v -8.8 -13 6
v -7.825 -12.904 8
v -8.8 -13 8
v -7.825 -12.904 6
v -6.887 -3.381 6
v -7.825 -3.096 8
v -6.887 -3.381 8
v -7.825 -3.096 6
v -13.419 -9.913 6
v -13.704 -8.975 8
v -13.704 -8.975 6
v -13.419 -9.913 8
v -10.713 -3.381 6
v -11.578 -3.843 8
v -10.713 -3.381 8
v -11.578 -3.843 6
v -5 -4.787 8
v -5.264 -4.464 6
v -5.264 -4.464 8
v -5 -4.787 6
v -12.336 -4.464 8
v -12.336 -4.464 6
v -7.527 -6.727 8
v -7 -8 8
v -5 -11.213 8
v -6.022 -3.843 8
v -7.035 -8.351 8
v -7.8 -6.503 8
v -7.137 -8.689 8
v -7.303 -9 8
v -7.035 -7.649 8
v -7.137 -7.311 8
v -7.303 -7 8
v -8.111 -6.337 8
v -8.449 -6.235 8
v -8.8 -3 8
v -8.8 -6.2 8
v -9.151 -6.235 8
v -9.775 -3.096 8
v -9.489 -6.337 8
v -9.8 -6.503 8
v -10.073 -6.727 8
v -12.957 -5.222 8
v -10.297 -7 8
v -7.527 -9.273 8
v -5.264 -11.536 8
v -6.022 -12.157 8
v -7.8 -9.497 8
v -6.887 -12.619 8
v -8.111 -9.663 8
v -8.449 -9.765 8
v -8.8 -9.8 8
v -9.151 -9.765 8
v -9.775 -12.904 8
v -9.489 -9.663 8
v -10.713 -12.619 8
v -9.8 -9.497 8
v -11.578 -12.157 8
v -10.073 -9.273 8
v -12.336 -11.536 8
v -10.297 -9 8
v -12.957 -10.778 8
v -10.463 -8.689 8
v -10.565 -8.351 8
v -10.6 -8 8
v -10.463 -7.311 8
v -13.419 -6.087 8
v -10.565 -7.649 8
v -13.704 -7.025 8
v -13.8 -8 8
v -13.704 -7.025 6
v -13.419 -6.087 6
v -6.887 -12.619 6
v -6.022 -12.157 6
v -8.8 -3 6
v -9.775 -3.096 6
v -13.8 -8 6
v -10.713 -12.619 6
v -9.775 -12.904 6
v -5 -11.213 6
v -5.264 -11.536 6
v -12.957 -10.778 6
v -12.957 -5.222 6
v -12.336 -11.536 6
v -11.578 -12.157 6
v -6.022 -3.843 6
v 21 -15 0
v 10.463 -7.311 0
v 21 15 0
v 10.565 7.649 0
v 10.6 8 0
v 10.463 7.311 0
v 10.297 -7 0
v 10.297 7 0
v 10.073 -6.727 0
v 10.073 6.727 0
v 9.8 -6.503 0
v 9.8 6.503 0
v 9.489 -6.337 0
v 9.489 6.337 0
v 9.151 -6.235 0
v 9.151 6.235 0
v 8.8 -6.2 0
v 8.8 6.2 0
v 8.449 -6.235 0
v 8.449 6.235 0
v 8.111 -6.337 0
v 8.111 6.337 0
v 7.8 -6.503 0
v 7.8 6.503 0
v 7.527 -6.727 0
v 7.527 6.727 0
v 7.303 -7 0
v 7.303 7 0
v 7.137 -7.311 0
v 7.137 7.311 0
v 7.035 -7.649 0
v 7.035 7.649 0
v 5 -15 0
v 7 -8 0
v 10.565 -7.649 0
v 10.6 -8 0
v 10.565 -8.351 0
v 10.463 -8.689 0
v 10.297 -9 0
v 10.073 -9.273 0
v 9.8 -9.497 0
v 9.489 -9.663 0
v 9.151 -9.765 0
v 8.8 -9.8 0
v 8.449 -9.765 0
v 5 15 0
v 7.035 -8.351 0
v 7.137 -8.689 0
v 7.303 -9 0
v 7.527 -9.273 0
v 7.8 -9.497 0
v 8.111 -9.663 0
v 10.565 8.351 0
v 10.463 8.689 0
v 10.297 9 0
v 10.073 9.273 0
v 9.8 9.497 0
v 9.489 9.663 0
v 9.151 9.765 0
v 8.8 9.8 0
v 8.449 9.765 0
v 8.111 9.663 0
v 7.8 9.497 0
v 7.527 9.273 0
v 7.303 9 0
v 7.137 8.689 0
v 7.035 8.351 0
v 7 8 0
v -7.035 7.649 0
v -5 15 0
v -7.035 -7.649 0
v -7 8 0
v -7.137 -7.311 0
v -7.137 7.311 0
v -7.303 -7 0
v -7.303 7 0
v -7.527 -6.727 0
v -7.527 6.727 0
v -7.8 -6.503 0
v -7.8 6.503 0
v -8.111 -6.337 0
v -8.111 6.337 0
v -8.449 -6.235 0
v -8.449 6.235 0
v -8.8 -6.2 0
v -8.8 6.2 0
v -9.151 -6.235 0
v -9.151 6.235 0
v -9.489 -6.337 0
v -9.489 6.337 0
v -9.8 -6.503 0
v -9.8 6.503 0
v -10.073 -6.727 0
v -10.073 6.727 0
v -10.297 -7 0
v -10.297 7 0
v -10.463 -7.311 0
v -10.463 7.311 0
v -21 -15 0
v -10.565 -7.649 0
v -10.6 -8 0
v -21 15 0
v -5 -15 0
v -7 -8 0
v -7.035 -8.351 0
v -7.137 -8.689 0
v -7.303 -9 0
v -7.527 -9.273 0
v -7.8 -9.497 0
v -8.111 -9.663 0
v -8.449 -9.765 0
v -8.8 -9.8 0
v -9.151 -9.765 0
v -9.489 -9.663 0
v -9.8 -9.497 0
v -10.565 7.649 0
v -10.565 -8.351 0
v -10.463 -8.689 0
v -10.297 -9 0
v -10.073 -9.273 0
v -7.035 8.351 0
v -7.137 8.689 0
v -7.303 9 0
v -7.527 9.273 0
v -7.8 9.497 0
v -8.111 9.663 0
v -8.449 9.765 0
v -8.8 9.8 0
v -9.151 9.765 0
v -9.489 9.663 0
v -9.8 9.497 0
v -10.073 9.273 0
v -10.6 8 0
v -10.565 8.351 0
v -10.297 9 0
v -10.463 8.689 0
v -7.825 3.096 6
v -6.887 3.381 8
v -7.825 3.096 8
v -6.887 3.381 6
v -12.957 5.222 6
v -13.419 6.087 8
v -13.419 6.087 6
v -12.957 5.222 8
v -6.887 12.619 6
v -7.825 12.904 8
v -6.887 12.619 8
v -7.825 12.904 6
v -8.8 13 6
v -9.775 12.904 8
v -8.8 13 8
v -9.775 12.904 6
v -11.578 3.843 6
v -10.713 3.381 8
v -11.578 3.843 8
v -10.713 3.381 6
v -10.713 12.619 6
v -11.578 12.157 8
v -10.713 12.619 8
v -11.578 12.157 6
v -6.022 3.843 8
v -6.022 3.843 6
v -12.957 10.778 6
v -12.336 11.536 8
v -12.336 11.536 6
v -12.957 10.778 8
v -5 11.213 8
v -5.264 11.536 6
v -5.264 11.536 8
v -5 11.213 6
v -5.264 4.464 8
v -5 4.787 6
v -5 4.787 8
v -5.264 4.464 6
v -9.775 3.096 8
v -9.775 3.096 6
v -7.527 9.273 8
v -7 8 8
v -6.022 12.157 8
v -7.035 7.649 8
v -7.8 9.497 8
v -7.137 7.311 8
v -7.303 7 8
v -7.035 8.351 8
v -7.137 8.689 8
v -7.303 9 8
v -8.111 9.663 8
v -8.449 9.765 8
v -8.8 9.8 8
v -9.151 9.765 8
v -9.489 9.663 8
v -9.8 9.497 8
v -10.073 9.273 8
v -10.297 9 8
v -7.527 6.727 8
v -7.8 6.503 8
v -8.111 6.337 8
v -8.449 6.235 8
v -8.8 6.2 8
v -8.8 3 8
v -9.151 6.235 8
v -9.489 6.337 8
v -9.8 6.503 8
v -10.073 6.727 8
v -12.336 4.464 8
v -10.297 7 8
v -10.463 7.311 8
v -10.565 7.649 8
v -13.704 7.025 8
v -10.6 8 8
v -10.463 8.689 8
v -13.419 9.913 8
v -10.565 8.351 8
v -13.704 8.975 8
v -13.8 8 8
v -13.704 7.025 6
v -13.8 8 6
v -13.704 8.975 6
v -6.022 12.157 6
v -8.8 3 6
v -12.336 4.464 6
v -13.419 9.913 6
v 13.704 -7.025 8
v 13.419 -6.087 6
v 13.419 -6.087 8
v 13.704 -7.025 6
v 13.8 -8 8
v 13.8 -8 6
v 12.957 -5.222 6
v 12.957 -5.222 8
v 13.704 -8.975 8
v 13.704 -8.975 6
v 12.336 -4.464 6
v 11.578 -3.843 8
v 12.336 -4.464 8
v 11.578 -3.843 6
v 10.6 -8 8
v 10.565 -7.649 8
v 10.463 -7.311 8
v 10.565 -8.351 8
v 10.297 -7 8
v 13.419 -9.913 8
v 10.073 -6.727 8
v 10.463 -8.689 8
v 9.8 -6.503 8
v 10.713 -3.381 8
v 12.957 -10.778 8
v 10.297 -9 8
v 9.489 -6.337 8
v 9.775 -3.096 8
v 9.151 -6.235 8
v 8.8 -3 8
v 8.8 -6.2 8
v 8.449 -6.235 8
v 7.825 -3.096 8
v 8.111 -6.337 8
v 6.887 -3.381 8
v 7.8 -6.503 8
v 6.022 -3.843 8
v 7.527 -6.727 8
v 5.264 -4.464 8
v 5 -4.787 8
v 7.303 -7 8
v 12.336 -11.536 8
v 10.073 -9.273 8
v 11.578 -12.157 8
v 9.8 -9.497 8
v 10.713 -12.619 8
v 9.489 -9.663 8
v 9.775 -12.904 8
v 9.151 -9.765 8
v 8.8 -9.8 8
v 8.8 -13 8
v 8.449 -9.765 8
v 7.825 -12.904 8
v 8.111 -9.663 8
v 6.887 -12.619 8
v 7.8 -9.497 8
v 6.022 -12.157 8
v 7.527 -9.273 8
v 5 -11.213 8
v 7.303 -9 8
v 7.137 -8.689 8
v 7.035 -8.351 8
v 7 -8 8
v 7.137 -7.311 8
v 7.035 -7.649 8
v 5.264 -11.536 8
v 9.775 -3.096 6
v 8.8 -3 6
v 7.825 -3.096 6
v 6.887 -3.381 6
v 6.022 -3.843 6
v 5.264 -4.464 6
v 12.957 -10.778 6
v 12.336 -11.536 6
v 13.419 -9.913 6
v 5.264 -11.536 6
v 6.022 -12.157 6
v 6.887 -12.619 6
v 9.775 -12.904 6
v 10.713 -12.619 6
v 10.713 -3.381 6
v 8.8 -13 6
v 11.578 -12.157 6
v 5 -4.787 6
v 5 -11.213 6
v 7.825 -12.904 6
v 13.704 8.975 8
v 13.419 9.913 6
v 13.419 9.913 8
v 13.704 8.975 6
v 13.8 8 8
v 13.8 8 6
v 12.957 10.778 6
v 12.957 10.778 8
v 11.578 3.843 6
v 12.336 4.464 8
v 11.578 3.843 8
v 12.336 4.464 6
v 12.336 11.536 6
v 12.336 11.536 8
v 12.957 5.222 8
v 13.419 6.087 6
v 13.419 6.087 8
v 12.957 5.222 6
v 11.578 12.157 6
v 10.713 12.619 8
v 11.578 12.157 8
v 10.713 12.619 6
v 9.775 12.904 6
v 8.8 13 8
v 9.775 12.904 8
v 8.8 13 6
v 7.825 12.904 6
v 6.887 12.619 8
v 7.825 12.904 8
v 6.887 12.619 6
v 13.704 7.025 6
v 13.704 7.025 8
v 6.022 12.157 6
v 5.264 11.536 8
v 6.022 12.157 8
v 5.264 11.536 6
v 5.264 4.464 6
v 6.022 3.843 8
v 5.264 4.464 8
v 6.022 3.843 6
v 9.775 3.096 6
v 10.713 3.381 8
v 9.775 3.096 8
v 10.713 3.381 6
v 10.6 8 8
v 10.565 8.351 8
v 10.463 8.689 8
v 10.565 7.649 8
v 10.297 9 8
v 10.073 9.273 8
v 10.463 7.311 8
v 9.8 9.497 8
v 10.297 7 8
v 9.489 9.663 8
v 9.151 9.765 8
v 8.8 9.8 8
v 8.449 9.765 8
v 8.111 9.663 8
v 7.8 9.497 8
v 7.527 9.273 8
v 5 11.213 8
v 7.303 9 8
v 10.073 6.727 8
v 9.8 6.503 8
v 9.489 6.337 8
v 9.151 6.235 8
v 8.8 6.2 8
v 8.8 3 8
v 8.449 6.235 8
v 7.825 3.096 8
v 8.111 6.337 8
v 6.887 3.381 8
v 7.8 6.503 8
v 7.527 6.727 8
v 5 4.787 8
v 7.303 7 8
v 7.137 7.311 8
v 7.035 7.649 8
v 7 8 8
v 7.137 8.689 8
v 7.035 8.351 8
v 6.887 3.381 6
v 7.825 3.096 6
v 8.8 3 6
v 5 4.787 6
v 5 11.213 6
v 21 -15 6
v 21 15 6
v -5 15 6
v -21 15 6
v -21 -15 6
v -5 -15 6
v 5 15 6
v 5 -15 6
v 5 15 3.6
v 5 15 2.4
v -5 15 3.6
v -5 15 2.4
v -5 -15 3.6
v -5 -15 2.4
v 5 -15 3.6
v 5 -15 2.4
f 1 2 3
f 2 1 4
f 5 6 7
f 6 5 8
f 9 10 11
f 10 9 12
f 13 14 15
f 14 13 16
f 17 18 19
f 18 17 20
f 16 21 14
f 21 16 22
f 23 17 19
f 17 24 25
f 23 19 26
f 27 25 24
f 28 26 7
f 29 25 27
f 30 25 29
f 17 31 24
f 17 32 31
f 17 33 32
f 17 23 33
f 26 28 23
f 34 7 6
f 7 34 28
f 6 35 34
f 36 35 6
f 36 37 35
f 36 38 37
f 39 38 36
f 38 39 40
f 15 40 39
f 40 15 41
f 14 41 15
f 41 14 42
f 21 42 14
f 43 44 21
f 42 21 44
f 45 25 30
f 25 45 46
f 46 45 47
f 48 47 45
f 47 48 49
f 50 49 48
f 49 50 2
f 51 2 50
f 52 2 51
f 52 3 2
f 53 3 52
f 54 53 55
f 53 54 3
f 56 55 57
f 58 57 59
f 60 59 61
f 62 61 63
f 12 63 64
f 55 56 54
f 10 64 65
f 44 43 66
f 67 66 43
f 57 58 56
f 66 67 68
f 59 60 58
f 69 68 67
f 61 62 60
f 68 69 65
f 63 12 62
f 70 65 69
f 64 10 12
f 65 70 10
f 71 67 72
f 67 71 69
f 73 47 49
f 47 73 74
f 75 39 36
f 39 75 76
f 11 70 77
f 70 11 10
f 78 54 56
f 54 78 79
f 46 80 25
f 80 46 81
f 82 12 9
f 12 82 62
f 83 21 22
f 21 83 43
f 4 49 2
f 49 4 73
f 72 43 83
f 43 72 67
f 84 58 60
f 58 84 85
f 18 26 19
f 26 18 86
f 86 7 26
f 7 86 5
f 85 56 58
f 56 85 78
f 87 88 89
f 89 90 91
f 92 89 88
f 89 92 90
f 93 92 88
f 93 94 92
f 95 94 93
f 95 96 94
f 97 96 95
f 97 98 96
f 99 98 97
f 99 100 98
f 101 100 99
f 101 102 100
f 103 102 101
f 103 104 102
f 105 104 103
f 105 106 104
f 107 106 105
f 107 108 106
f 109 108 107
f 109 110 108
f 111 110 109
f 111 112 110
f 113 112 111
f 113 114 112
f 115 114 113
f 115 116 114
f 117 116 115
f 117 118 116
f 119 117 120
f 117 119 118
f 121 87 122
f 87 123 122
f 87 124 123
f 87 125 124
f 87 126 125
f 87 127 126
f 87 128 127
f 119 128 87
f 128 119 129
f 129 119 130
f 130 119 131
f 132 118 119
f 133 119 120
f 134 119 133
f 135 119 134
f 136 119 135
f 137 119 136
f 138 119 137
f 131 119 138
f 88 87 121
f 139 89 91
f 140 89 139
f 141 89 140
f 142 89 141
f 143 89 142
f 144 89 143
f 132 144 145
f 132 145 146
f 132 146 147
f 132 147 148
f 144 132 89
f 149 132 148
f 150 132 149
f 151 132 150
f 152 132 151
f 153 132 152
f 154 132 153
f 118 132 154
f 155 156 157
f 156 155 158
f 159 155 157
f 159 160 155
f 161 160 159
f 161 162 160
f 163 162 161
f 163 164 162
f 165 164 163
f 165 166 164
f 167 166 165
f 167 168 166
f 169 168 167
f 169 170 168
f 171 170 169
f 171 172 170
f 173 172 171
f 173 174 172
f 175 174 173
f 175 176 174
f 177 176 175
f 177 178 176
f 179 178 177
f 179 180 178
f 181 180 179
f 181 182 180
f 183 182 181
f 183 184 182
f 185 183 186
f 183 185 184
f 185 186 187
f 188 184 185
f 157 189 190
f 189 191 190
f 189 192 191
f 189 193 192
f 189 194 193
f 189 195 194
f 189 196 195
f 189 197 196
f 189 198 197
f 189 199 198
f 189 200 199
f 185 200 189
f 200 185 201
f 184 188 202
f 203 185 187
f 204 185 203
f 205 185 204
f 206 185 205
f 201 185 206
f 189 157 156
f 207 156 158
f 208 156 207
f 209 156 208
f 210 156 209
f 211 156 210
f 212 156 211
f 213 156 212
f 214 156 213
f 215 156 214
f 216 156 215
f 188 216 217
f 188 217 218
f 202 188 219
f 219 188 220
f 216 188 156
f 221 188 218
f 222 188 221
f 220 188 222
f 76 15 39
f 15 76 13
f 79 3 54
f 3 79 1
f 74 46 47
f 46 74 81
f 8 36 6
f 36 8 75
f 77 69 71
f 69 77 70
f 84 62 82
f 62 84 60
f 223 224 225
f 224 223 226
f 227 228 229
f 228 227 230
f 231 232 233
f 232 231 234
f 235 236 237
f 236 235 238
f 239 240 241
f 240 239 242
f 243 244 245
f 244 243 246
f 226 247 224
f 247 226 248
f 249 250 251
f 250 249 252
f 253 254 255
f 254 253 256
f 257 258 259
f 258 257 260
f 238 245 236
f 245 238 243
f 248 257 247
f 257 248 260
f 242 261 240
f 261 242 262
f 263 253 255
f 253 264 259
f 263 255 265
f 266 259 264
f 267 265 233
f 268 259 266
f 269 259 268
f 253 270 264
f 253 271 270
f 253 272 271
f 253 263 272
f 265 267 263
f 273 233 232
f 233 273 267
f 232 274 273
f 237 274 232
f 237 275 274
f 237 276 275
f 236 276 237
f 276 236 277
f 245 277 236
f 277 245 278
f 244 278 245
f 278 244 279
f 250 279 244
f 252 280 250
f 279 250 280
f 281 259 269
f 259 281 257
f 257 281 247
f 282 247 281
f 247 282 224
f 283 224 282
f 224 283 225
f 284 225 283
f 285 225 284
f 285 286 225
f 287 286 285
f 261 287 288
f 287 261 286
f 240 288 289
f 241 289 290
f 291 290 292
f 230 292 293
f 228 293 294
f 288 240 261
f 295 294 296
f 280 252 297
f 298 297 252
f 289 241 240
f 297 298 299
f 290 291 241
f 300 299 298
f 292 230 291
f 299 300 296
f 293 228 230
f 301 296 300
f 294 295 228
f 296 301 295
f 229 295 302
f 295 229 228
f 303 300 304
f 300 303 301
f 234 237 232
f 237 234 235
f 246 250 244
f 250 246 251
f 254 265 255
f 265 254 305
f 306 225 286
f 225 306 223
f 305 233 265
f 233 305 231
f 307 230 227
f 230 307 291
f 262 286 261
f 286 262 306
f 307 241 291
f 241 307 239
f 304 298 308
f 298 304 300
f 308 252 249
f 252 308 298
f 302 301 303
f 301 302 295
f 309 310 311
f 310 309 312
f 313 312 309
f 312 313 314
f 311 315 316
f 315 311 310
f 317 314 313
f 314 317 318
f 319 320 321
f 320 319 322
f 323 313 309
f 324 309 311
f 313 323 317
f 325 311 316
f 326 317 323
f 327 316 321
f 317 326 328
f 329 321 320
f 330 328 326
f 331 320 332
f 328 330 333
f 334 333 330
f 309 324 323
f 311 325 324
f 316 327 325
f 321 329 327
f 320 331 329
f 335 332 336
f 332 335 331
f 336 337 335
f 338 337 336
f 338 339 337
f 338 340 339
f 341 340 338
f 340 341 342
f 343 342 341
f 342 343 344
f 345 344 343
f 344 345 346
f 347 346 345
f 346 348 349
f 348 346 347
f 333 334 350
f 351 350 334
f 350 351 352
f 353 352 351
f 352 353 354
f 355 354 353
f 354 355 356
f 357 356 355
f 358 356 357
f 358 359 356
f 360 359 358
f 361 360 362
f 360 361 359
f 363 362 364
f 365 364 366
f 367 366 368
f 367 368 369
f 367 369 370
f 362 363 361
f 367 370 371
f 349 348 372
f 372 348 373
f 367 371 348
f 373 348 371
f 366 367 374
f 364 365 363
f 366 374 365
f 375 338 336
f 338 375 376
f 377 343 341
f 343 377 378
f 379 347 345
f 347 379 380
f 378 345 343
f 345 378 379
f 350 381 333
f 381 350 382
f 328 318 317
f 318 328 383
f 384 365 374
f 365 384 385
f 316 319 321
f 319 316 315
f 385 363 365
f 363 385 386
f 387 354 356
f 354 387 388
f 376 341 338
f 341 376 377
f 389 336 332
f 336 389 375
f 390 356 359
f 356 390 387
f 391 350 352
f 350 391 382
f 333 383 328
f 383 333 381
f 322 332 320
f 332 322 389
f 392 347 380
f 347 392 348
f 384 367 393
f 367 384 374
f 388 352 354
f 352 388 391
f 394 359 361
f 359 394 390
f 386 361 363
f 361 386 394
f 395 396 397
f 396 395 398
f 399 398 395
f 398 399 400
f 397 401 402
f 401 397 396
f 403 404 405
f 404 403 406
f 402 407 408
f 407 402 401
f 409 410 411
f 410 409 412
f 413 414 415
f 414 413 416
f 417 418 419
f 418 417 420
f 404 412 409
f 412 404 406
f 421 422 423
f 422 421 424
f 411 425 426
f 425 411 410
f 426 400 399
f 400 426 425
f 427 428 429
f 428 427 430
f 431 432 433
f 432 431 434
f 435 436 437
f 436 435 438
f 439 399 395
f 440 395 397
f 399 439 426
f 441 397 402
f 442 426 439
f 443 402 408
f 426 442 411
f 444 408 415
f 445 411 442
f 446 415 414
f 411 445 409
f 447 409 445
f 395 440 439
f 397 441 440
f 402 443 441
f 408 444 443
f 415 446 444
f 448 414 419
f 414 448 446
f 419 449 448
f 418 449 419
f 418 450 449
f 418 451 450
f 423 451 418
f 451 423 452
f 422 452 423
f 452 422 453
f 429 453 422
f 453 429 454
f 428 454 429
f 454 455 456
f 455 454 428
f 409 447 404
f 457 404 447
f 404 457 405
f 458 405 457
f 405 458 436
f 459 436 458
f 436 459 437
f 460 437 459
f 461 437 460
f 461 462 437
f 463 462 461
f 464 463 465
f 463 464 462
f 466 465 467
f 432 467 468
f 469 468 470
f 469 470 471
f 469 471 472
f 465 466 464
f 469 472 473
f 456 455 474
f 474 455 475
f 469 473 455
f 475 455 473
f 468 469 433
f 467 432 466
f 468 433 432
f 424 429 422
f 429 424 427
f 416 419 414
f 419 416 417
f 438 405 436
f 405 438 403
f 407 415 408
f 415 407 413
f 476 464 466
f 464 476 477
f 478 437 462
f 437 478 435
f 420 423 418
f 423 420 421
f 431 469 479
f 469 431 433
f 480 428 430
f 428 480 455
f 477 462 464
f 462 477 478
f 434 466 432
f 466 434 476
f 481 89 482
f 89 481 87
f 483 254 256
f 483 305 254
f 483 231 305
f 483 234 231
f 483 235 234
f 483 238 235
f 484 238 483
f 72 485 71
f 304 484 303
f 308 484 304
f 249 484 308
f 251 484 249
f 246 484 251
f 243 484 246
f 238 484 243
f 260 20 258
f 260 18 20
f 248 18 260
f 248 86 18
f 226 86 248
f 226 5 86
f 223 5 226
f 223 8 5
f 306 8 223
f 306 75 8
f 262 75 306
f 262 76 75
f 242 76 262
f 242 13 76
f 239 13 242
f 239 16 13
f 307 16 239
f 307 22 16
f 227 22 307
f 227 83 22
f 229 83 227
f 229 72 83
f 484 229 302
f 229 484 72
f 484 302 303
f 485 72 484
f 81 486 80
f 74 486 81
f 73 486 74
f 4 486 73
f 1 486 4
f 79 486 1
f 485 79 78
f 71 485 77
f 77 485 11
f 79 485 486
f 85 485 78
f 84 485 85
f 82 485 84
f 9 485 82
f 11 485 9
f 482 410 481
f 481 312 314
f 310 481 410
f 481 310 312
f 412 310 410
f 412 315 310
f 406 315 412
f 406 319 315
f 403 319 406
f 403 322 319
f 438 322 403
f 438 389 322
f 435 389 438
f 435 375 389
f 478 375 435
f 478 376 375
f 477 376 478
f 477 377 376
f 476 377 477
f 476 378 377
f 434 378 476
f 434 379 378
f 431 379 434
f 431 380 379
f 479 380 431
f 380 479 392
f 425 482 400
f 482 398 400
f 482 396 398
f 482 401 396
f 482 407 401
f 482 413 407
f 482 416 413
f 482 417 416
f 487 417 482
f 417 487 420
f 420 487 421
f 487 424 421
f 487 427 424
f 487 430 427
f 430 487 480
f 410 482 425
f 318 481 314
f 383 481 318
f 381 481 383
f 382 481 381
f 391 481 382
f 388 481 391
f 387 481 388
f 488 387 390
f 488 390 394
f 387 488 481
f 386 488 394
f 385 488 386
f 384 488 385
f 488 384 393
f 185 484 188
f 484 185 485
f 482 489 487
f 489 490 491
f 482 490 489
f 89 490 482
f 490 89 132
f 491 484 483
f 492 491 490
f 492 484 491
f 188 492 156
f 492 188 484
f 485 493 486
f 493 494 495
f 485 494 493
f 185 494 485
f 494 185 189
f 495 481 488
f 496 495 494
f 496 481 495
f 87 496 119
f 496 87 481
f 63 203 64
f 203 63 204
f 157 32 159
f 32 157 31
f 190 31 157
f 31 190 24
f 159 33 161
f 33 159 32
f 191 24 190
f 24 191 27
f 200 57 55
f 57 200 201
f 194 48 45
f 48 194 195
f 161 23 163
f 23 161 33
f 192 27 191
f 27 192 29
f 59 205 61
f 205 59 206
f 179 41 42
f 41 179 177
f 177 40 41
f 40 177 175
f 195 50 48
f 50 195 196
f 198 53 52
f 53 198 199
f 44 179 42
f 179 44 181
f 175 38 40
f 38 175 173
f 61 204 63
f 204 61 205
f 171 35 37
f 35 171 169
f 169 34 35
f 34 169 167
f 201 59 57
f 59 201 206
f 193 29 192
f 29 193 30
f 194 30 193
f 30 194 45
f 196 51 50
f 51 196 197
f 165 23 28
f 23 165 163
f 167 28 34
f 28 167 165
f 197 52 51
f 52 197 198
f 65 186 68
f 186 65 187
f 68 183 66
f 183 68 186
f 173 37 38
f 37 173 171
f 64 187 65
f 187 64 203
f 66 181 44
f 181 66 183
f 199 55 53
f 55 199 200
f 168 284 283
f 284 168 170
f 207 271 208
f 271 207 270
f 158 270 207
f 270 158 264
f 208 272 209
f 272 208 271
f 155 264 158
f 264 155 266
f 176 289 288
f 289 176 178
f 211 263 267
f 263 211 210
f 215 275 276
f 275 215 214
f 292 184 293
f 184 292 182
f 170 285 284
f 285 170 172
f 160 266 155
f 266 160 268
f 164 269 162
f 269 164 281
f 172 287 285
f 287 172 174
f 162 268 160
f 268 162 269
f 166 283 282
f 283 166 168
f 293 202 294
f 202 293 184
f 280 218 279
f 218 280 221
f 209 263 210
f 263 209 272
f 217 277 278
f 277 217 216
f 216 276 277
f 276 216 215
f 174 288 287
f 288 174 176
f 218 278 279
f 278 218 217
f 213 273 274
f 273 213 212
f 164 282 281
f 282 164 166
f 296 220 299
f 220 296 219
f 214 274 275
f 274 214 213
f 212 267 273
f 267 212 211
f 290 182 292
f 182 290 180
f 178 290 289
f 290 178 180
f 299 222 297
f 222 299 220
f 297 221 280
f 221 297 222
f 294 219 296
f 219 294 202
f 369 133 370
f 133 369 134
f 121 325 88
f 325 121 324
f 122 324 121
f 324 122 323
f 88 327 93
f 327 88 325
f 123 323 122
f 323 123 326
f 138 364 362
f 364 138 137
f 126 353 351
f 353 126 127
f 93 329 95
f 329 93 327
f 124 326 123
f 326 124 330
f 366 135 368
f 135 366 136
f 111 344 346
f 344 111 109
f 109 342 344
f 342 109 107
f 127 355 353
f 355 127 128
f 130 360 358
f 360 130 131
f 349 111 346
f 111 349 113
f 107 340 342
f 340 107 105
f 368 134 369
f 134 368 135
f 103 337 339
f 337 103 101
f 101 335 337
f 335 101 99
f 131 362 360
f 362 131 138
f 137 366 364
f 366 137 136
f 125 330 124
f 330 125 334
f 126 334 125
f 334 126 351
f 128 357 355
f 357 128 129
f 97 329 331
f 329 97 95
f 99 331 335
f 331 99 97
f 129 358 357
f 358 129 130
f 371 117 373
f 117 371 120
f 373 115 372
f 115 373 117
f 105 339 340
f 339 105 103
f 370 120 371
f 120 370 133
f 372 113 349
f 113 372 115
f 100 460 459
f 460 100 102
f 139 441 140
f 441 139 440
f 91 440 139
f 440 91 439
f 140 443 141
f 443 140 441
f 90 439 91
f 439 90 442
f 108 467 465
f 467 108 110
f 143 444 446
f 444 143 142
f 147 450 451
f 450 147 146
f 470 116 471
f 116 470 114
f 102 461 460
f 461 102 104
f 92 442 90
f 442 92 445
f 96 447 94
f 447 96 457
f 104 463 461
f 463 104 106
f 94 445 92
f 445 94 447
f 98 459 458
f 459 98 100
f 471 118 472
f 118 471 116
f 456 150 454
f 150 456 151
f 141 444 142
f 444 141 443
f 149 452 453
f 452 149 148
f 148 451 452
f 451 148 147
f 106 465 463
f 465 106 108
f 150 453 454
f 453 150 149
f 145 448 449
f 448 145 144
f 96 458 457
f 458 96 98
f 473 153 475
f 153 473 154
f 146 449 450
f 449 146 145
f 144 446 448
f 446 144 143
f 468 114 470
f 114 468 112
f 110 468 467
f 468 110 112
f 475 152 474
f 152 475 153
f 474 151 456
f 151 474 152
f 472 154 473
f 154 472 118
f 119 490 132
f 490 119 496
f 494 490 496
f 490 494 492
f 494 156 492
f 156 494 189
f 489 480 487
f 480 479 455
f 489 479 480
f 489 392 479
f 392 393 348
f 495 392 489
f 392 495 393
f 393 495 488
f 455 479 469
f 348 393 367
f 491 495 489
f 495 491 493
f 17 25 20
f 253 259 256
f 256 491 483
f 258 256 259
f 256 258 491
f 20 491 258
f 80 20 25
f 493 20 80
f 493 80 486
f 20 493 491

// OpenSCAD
$fn = 32;

// ----------------------------------------------------------------------
// Living hinge: 42 x 30 mm plates, 1.2 mm flexible web
// ----------------------------------------------------------------------

// --- parameters (mm) ---
plate_len = 16;           // plate length outside the web
plate_w = 30;             // plate width
thick = 6;                // plate thickness
web_half = 5;             // half width of the flex band
web_t = 1.2;              // flexible web thickness
web_z = 2.4;              // web position inside the thickness
boss_d = 10;              // screw boss diameter
boss_h = 8;               // screw boss height
boss_x = 8.8;             // screw boss distance from the web
screw_d = 3.6;            // screw hole

difference() {
  union() {
    /* one flat strip, later thinned at the middle */
    translate([-21, -15, 0]) cube([42, 30, 6]);
    /* screw bosses, sunk 0.5 mm into the plates */
    for (sx = [-8.8, 8.8]) {
      for (sy = [-8, 8]) {
        translate([sx, sy, 0]) cylinder(h = boss_h, d = boss_d);
      }
    }
  }
  /* channel from below: leaves the web on top of it */
  translate([-5, -17.5, -2.5]) cube([10, 35, 4.9]);
  /* channel from above: thins the web down to web_t */
  translate([-5, -17.5, 3.6]) cube([10, 35, 4.9]);
  /* screw holes through the bosses */
  for (sx = [-8.8, 8.8]) {
    for (sy = [-8, 8]) {
      translate([sx, sy, -2.5]) cylinder(h = boss_h + 5, d = screw_d);
    }
  }
}
